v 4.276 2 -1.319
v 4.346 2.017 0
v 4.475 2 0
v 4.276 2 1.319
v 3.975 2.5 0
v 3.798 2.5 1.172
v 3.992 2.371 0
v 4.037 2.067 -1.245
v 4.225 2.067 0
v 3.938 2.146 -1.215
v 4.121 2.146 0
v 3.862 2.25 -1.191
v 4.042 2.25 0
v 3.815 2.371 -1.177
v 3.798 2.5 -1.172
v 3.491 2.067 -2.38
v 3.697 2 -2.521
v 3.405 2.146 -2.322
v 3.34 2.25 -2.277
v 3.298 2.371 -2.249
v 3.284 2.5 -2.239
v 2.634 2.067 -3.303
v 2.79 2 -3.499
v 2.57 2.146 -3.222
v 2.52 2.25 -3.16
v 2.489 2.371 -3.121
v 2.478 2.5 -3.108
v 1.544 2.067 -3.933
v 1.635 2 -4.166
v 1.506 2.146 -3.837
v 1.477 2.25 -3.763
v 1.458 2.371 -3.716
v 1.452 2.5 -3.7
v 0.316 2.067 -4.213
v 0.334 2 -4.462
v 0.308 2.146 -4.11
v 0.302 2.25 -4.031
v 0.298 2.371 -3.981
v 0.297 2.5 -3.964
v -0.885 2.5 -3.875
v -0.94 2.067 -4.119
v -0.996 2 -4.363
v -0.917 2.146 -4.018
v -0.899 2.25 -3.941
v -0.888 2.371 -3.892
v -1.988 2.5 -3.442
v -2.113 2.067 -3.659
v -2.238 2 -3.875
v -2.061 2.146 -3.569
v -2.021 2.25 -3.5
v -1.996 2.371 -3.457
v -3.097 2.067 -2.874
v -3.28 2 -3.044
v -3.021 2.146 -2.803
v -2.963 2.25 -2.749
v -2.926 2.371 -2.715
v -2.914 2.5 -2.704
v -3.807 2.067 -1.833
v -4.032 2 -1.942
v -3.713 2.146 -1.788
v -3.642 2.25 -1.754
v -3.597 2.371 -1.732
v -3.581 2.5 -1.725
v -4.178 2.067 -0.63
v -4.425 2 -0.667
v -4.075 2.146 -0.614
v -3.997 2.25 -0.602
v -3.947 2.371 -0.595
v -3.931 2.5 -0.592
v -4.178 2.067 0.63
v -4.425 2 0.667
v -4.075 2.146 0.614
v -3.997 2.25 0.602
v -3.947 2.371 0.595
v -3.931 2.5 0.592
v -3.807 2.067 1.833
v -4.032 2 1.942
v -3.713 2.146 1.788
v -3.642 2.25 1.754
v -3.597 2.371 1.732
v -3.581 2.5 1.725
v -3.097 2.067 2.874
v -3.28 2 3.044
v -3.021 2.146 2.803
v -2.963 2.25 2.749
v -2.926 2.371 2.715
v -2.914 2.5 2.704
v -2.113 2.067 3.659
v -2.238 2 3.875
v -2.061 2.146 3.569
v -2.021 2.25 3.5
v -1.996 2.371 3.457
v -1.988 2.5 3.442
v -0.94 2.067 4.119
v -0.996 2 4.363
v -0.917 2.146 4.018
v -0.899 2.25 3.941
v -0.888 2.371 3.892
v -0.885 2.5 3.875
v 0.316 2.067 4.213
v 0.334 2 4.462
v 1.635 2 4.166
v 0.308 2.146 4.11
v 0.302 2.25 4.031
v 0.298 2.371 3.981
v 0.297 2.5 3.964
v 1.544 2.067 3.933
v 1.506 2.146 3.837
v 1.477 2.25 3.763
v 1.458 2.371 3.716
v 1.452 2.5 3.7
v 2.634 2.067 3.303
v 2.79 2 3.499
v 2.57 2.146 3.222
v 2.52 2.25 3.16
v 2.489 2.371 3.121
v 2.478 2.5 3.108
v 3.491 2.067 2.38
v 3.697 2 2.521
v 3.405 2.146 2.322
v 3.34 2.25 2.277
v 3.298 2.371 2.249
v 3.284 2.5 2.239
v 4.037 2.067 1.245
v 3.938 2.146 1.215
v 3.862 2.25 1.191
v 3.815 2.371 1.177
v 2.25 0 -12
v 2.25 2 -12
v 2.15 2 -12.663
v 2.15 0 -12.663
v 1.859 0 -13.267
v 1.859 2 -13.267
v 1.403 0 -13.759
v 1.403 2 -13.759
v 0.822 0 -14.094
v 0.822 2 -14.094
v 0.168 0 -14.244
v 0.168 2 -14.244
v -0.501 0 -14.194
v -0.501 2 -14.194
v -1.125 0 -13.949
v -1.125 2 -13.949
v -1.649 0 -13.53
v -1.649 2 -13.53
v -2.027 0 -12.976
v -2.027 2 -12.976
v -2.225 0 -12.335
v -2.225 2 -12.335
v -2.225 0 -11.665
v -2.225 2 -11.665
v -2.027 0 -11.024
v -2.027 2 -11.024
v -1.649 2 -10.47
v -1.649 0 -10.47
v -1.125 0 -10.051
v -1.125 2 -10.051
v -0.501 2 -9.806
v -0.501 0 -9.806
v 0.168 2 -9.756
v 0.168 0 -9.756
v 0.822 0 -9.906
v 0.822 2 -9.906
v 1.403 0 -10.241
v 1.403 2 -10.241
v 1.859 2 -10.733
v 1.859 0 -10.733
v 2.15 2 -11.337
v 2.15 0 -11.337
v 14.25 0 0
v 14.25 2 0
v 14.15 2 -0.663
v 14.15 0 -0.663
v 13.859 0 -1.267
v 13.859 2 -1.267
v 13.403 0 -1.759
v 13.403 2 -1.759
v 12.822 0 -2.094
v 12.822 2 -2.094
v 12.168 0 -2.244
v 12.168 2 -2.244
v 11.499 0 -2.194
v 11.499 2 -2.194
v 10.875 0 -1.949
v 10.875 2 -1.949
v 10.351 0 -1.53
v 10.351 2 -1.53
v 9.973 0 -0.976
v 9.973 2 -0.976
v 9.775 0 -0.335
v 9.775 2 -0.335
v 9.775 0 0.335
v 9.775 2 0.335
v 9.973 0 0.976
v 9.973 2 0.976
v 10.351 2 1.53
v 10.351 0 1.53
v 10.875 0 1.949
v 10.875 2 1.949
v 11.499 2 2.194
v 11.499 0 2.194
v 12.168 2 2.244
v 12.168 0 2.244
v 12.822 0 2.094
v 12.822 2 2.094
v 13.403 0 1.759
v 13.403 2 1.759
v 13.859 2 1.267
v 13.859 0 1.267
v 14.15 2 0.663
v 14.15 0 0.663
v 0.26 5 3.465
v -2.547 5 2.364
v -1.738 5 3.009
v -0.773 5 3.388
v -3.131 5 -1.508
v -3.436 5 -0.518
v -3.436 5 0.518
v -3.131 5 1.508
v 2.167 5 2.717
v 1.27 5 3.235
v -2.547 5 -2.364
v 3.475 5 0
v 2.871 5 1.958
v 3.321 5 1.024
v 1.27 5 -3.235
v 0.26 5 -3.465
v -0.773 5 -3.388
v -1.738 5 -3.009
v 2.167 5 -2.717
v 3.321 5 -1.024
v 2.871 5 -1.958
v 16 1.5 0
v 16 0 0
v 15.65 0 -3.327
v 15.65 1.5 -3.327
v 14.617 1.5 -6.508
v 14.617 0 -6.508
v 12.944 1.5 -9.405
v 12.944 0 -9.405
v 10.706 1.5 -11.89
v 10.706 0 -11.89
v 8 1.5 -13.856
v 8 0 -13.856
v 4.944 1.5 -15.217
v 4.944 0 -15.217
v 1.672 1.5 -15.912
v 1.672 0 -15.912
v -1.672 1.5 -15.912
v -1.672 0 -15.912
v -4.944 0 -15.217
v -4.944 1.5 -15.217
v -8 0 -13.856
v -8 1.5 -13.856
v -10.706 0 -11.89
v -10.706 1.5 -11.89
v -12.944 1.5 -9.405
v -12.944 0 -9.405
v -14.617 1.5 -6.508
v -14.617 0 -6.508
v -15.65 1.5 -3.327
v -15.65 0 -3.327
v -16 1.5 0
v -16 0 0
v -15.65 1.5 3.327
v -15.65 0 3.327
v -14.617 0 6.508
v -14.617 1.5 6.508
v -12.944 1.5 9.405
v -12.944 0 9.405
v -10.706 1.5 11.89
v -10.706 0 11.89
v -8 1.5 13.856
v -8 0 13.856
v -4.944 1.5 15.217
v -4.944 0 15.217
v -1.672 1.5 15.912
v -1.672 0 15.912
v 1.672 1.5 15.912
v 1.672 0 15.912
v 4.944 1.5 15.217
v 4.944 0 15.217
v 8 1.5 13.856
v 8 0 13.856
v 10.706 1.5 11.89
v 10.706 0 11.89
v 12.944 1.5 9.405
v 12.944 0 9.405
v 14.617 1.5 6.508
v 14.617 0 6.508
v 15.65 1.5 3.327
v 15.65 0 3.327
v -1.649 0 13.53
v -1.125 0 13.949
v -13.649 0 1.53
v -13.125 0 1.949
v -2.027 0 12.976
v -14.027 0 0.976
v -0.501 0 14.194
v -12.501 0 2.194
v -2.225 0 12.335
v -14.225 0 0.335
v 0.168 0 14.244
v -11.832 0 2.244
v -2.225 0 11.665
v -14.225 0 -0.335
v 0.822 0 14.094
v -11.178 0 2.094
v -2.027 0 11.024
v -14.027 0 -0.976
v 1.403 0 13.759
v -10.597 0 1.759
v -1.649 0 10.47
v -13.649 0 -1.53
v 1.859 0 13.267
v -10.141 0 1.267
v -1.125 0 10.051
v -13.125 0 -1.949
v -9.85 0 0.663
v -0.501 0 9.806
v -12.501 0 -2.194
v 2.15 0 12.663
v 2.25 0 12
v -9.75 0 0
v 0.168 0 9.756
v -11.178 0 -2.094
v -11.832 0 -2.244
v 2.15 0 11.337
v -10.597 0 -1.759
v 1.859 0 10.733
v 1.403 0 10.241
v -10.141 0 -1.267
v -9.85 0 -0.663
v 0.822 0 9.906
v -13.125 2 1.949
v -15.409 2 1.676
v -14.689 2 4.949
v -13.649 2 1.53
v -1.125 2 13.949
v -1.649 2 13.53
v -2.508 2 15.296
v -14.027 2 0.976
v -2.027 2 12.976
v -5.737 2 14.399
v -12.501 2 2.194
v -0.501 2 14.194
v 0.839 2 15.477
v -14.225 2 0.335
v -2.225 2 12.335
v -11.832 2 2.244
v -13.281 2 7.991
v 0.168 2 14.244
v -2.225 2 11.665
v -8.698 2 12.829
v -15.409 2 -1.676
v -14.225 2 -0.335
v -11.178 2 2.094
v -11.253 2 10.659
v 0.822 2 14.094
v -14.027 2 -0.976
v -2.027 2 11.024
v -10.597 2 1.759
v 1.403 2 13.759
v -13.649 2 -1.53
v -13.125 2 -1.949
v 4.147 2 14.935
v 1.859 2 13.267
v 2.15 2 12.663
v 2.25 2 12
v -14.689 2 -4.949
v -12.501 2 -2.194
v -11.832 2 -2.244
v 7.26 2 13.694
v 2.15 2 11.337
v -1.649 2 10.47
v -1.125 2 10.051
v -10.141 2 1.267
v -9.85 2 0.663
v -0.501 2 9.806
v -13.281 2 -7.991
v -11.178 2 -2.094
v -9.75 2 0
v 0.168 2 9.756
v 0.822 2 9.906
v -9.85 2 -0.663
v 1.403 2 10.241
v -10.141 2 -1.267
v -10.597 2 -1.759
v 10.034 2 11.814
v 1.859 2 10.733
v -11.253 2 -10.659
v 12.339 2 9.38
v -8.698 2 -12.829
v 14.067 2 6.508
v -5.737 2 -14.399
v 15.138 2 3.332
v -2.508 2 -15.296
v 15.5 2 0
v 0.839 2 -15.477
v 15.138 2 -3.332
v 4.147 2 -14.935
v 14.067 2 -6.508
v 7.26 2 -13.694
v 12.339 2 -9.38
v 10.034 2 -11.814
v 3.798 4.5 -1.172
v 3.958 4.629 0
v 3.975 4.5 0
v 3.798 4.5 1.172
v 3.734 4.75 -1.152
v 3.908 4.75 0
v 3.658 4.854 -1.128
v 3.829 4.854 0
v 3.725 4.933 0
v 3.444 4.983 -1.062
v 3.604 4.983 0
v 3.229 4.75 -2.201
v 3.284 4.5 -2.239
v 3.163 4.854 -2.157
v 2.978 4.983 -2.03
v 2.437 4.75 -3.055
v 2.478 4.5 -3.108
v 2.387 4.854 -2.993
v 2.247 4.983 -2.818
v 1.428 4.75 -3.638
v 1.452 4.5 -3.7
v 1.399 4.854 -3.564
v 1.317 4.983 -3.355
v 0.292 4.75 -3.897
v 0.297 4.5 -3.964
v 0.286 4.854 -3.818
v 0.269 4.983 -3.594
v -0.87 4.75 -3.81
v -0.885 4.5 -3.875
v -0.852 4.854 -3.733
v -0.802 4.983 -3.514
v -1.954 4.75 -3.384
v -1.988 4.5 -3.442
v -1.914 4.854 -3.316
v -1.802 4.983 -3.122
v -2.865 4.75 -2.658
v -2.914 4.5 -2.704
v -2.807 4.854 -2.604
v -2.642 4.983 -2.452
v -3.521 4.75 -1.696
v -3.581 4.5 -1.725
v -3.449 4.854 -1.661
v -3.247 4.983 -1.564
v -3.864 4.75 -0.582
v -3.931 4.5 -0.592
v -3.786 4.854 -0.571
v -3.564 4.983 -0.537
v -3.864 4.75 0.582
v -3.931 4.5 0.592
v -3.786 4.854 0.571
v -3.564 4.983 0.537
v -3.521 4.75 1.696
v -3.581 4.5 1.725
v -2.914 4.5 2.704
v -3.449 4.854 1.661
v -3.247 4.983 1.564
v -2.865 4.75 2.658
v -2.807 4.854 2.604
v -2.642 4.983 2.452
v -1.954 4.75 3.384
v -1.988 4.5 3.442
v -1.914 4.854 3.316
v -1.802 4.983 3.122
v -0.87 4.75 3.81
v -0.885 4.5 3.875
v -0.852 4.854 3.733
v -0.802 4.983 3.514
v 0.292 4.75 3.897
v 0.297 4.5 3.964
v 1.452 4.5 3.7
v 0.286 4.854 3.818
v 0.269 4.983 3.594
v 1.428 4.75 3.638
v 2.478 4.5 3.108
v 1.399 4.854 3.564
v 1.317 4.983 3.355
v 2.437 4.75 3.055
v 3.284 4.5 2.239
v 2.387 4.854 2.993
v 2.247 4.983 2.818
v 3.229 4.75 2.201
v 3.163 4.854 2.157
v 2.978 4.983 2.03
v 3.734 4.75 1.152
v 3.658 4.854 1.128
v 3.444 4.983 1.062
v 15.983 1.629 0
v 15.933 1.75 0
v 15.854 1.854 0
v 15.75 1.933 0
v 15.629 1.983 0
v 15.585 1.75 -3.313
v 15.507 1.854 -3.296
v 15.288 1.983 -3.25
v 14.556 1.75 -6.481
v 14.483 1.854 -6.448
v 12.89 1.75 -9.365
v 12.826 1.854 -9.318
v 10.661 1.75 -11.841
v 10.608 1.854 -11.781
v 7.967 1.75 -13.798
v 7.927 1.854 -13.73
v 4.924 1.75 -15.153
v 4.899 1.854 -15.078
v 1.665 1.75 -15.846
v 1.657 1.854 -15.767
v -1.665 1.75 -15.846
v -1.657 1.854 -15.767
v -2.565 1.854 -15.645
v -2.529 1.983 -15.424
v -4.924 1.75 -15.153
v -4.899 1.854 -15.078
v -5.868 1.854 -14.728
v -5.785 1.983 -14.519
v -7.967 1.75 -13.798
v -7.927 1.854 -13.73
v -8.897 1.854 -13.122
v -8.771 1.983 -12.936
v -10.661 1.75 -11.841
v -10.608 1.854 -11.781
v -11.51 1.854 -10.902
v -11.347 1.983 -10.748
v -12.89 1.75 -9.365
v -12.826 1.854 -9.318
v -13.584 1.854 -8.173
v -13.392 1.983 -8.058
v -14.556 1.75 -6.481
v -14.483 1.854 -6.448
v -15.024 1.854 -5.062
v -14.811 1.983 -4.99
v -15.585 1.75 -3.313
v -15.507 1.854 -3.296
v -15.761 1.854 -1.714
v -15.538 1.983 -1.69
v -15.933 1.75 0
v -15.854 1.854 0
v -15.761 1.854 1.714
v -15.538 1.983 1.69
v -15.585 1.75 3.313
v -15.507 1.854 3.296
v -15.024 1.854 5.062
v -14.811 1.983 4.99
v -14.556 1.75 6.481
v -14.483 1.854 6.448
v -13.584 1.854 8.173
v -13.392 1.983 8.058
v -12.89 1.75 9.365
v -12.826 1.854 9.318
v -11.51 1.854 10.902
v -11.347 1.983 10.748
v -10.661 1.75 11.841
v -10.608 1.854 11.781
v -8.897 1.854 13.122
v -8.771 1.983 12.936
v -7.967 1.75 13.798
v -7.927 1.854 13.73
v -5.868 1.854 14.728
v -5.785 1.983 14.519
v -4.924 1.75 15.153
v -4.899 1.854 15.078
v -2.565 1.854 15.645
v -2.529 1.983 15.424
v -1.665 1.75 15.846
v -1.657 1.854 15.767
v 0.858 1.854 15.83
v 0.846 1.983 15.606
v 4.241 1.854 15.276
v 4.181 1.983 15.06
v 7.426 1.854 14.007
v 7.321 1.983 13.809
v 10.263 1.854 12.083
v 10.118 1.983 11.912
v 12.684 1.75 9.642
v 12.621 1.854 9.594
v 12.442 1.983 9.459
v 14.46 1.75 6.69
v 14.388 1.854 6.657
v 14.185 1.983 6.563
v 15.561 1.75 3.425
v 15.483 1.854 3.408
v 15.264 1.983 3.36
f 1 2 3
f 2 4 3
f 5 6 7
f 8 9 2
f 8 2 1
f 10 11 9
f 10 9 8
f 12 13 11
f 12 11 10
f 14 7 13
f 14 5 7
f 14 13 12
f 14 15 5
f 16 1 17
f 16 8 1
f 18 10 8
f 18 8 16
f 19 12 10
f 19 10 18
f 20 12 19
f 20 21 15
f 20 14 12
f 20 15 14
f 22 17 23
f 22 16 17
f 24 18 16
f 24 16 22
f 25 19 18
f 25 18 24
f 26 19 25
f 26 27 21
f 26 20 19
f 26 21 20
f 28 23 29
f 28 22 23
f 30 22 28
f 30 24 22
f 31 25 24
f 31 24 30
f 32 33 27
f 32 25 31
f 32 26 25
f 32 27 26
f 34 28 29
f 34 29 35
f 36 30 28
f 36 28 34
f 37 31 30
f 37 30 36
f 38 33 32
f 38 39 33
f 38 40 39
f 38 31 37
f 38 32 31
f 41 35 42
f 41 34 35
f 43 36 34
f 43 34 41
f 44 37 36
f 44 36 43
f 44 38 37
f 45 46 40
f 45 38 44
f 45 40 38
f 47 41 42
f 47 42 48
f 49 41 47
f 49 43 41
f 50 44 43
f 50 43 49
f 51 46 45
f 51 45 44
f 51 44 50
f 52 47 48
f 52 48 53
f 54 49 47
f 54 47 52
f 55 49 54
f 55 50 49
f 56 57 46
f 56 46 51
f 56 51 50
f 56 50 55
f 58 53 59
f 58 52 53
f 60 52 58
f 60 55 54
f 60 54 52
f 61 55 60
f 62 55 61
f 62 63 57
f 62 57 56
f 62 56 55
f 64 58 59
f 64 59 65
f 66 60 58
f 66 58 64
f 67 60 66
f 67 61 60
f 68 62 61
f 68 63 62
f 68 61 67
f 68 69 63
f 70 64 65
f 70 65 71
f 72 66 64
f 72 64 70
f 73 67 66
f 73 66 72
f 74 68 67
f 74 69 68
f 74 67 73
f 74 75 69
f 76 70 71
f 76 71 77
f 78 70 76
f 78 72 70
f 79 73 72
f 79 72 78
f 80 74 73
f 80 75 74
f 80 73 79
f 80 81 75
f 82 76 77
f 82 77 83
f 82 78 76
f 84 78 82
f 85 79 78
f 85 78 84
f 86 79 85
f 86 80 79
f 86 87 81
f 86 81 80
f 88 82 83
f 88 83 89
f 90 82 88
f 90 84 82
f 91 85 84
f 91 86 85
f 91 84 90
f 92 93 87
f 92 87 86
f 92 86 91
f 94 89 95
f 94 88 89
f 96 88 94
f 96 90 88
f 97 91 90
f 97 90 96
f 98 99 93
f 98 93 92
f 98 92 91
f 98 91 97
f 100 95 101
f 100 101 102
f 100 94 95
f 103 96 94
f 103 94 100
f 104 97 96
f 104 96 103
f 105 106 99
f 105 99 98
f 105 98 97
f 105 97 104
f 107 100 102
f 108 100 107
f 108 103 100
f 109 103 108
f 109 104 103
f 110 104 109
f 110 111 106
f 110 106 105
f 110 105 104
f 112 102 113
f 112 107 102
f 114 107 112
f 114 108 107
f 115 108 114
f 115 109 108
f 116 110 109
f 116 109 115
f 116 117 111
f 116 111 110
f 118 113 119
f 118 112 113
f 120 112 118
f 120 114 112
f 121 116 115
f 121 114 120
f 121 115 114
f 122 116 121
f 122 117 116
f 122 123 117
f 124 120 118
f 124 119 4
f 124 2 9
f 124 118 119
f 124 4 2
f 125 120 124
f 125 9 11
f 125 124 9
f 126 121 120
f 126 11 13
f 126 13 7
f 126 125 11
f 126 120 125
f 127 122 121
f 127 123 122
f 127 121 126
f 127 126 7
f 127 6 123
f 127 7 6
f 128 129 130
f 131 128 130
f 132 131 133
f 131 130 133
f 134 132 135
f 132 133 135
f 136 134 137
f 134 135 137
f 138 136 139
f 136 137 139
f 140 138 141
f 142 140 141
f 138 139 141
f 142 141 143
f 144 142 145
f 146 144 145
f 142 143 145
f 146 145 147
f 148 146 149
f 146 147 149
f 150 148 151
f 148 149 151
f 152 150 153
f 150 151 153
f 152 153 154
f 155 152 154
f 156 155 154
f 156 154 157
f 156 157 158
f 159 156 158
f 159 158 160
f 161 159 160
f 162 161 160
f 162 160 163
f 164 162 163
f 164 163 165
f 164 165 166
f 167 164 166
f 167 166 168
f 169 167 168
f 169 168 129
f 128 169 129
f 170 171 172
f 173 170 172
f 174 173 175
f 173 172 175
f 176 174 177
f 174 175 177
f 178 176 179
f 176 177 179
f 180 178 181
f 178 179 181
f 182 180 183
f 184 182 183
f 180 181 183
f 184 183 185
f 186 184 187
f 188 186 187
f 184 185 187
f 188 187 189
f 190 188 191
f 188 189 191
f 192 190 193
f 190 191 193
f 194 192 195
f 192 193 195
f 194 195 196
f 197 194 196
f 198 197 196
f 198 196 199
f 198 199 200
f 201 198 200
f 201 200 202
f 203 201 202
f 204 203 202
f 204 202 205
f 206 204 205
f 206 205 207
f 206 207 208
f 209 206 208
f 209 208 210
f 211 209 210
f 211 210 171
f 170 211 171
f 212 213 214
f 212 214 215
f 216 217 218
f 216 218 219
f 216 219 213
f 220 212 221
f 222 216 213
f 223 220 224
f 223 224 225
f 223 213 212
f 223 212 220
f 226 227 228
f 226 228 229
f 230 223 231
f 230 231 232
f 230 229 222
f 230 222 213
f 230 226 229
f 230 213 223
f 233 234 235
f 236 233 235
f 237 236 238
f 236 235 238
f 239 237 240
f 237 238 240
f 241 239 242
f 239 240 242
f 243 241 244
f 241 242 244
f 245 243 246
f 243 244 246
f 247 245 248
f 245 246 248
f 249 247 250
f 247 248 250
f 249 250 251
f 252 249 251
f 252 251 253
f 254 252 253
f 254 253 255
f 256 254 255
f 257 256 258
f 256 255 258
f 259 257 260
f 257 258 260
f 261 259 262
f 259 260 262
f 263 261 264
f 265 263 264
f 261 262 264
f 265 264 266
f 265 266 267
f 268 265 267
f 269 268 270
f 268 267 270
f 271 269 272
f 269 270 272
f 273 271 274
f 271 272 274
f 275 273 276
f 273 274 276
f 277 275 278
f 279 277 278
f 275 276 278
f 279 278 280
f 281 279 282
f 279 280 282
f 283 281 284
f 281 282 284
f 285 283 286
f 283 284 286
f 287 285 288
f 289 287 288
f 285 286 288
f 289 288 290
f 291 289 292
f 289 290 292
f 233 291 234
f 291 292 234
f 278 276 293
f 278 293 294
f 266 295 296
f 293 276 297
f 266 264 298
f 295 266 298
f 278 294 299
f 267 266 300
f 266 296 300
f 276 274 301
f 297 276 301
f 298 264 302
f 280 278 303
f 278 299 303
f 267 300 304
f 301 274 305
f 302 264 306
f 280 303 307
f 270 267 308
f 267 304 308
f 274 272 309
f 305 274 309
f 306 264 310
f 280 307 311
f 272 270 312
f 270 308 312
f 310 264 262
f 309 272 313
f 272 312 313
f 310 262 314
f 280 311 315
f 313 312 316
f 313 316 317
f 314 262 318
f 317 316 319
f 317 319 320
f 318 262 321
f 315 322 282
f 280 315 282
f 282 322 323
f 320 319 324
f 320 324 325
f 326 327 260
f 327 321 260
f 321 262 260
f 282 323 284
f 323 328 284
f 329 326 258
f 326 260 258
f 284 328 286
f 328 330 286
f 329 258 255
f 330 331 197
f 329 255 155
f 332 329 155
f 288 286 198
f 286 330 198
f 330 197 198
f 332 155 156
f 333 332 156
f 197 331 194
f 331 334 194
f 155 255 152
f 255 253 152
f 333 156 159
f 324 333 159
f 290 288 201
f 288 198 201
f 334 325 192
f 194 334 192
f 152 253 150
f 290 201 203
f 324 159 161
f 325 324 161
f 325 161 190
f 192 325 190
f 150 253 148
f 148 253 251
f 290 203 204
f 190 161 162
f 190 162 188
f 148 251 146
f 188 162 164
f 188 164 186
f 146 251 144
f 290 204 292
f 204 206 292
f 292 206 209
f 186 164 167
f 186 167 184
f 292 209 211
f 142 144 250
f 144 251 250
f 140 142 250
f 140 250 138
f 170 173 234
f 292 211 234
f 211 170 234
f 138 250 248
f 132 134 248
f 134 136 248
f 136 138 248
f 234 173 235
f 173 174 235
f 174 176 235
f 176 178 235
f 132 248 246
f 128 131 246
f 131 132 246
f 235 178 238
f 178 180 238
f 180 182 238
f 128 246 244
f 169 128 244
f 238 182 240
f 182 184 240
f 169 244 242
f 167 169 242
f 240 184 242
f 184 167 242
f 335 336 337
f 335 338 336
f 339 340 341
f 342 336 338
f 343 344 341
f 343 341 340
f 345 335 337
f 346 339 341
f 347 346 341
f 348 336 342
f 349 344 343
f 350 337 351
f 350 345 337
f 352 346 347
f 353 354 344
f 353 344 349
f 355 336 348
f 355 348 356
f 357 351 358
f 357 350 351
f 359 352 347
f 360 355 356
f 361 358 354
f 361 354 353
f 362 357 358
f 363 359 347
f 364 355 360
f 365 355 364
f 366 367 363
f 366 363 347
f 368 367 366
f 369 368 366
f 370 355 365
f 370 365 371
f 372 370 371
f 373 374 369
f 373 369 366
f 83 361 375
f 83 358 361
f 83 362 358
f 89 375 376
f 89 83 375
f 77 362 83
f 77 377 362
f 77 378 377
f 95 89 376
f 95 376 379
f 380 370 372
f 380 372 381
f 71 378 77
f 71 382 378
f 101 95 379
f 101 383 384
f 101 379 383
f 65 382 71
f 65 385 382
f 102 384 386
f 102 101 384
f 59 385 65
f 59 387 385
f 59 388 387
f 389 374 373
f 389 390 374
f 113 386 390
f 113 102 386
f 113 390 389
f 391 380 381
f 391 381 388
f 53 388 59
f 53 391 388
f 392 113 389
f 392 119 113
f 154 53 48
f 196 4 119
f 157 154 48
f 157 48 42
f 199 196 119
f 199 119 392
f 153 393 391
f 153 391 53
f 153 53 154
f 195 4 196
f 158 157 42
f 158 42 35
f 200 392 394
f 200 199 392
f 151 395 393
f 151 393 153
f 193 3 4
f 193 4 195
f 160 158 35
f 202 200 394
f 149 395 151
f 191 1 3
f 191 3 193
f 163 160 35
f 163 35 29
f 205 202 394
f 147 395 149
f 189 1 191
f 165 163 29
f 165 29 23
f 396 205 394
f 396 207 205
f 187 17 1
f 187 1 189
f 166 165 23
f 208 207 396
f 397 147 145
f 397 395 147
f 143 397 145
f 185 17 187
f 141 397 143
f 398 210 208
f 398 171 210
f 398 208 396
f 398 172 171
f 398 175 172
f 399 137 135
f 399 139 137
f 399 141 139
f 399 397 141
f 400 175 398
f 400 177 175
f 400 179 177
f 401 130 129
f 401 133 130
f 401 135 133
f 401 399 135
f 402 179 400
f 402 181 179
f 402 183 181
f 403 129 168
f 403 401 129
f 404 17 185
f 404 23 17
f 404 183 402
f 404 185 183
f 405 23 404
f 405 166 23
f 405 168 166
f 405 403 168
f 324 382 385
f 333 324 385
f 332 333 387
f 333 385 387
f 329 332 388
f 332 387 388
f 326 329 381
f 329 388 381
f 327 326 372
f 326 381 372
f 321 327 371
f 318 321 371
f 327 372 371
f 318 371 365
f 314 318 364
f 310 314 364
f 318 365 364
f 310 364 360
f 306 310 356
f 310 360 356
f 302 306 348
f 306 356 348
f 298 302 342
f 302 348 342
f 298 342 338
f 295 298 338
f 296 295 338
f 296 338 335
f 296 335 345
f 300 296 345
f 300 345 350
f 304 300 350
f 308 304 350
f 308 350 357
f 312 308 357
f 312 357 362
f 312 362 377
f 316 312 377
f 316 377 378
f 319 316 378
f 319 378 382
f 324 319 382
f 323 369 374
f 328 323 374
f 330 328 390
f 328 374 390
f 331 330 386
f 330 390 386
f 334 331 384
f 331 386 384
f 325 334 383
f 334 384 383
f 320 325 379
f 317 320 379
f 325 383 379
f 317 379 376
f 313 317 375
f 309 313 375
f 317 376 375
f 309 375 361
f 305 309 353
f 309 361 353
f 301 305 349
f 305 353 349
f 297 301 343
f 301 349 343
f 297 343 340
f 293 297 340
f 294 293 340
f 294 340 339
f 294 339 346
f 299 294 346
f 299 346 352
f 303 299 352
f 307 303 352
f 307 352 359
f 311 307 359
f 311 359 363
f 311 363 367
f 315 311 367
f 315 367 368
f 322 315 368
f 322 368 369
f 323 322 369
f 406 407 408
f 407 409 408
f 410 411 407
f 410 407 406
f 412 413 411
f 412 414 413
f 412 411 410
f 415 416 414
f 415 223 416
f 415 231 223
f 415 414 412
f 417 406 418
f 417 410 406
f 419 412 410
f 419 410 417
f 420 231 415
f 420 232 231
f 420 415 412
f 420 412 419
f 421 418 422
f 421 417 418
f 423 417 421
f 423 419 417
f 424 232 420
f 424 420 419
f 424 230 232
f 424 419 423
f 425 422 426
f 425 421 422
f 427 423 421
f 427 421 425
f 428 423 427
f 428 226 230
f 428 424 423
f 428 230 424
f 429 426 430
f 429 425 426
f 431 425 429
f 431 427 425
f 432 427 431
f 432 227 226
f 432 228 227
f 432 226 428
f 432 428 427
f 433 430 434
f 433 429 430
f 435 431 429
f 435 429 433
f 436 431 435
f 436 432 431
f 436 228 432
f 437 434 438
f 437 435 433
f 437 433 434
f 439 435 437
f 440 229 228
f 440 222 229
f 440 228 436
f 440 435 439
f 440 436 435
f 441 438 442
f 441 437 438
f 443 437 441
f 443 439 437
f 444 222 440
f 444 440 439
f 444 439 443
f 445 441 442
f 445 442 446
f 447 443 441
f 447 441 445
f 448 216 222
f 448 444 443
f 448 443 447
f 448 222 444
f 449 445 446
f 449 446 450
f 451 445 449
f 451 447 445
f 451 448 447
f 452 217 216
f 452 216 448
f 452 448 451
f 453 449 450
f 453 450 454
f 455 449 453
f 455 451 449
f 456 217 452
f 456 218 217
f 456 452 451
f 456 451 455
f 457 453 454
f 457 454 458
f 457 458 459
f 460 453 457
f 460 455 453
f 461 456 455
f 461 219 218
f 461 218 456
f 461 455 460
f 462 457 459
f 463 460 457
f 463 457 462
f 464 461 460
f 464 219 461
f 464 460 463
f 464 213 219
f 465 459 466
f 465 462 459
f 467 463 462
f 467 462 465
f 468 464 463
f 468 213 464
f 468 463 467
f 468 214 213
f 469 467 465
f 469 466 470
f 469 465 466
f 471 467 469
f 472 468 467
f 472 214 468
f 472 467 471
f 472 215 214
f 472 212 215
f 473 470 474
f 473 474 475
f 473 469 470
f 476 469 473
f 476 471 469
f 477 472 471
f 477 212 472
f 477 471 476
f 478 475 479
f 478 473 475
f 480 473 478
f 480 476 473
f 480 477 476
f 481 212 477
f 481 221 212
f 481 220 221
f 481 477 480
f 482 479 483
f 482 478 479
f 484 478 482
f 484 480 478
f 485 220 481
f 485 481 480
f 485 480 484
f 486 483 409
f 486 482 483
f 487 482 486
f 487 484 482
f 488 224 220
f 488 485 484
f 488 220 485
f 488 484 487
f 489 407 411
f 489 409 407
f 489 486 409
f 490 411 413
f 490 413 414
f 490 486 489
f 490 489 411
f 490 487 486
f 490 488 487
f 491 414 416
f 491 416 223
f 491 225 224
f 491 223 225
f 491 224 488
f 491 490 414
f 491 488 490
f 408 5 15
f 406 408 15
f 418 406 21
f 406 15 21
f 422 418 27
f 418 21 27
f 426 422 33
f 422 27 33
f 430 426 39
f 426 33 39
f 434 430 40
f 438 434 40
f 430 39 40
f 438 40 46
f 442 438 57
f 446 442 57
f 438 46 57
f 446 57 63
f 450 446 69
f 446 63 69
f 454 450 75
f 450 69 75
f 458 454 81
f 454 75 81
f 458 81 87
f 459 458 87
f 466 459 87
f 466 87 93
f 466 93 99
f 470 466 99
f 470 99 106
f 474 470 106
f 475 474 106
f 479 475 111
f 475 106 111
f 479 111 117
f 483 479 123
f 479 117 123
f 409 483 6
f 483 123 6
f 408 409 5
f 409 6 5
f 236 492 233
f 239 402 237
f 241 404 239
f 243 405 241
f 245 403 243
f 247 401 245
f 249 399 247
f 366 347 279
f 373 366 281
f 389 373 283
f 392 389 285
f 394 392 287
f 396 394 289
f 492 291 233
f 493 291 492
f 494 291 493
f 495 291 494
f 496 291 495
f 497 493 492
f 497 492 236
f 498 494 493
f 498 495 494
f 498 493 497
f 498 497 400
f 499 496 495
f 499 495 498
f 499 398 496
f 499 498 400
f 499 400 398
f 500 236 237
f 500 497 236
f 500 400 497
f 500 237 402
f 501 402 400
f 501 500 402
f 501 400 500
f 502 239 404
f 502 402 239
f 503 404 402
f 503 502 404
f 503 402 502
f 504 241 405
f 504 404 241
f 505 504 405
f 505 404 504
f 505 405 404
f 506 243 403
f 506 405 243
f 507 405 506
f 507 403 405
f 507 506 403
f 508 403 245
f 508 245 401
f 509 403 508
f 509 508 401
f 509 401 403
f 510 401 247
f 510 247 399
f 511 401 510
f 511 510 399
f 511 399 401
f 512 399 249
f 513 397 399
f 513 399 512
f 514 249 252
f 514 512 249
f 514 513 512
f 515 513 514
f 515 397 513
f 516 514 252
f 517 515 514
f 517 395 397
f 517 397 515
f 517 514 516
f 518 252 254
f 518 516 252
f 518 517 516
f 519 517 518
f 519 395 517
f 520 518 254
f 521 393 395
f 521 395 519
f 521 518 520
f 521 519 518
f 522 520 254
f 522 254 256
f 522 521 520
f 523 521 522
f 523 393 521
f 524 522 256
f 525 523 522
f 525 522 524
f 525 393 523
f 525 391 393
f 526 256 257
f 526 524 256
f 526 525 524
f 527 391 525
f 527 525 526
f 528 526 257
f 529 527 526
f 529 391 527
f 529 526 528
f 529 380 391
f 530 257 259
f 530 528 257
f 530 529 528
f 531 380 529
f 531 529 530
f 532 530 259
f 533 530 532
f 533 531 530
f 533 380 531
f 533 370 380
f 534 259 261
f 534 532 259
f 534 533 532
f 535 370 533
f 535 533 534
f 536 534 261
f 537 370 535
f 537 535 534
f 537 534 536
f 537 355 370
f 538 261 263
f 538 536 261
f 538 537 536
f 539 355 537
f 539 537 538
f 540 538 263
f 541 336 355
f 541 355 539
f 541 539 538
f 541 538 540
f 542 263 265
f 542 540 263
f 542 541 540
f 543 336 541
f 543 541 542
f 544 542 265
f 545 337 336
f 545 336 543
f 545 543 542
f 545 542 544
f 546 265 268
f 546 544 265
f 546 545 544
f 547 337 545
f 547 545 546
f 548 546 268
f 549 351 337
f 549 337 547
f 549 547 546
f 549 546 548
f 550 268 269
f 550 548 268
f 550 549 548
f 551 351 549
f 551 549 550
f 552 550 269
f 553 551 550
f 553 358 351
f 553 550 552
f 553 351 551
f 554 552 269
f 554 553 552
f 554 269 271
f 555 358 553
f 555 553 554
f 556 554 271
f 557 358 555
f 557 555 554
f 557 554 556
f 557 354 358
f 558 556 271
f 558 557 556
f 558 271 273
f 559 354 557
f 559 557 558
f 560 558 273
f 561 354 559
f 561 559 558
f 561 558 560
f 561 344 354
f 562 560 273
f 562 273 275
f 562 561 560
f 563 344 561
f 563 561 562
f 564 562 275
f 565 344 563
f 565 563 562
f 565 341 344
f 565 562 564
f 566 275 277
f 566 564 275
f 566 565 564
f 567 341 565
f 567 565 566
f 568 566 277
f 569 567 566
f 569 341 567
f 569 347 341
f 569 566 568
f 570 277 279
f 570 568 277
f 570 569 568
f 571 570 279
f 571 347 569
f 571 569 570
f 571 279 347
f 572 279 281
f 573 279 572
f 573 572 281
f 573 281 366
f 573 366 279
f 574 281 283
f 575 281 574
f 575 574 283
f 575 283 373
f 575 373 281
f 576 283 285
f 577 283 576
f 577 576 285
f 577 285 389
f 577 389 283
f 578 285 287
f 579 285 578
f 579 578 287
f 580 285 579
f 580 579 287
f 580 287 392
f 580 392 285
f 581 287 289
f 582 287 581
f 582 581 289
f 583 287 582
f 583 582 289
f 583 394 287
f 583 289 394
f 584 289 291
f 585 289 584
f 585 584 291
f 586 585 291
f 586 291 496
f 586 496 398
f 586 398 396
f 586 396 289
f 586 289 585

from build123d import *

# Parameters (mm, degrees)
SKETCH1_R           = 16
BOSS_EXTRUDE1_DEPTH = 2
SKETCH5_R           = 2.25
CUT_EXTRUDE1_DEPTH  = 3
SKETCH6_R           = 3.975
BOSS_EXTRUDE2_DEPTH = 3
FILLET1_R           = 0.5


with BuildPart() as part:
    # Sketch1 → Boss-Extrude1 (new body)
    with BuildSketch(Plane(origin=(0, 0, 0), x_dir=(1, 0, 0), z_dir=(0, 1, 0))):
        Circle(SKETCH1_R)
    extrude(amount=BOSS_EXTRUDE1_DEPTH)

    # Sketch5 → Cut-Extrude1 (cut, through all)
    with BuildSketch(Plane(origin=(0, 2, 0), x_dir=(1, 0, 0), z_dir=(0, 1, 0))):
        with Locations((0, 12)):
            Circle(SKETCH5_R)
        with Locations((12, 0)):
            Circle(SKETCH5_R)
        with Locations((0, -12)):
            Circle(SKETCH5_R)
        with Locations((-12, 0)):
            Circle(SKETCH5_R)
    extrude(amount=-CUT_EXTRUDE1_DEPTH, mode=Mode.SUBTRACT)

    # Sketch6 → Boss-Extrude2 (add)
    with BuildSketch(Plane(origin=(0, 2, 0), x_dir=(1, 0, 0), z_dir=(0, 1, 0))):
        Circle(SKETCH6_R)
    extrude(amount=BOSS_EXTRUDE2_DEPTH)

    # Fillet1
    fillet1_edges = [part.edges().sort_by_distance(p)[0] for p in [
        (-3.975, 2, 0),
        (-3.975, 5, 0),
        (-16, 2, 0),
    ]]
    fillet(fillet1_edges, radius=FILLET1_R)


solid = part.part
